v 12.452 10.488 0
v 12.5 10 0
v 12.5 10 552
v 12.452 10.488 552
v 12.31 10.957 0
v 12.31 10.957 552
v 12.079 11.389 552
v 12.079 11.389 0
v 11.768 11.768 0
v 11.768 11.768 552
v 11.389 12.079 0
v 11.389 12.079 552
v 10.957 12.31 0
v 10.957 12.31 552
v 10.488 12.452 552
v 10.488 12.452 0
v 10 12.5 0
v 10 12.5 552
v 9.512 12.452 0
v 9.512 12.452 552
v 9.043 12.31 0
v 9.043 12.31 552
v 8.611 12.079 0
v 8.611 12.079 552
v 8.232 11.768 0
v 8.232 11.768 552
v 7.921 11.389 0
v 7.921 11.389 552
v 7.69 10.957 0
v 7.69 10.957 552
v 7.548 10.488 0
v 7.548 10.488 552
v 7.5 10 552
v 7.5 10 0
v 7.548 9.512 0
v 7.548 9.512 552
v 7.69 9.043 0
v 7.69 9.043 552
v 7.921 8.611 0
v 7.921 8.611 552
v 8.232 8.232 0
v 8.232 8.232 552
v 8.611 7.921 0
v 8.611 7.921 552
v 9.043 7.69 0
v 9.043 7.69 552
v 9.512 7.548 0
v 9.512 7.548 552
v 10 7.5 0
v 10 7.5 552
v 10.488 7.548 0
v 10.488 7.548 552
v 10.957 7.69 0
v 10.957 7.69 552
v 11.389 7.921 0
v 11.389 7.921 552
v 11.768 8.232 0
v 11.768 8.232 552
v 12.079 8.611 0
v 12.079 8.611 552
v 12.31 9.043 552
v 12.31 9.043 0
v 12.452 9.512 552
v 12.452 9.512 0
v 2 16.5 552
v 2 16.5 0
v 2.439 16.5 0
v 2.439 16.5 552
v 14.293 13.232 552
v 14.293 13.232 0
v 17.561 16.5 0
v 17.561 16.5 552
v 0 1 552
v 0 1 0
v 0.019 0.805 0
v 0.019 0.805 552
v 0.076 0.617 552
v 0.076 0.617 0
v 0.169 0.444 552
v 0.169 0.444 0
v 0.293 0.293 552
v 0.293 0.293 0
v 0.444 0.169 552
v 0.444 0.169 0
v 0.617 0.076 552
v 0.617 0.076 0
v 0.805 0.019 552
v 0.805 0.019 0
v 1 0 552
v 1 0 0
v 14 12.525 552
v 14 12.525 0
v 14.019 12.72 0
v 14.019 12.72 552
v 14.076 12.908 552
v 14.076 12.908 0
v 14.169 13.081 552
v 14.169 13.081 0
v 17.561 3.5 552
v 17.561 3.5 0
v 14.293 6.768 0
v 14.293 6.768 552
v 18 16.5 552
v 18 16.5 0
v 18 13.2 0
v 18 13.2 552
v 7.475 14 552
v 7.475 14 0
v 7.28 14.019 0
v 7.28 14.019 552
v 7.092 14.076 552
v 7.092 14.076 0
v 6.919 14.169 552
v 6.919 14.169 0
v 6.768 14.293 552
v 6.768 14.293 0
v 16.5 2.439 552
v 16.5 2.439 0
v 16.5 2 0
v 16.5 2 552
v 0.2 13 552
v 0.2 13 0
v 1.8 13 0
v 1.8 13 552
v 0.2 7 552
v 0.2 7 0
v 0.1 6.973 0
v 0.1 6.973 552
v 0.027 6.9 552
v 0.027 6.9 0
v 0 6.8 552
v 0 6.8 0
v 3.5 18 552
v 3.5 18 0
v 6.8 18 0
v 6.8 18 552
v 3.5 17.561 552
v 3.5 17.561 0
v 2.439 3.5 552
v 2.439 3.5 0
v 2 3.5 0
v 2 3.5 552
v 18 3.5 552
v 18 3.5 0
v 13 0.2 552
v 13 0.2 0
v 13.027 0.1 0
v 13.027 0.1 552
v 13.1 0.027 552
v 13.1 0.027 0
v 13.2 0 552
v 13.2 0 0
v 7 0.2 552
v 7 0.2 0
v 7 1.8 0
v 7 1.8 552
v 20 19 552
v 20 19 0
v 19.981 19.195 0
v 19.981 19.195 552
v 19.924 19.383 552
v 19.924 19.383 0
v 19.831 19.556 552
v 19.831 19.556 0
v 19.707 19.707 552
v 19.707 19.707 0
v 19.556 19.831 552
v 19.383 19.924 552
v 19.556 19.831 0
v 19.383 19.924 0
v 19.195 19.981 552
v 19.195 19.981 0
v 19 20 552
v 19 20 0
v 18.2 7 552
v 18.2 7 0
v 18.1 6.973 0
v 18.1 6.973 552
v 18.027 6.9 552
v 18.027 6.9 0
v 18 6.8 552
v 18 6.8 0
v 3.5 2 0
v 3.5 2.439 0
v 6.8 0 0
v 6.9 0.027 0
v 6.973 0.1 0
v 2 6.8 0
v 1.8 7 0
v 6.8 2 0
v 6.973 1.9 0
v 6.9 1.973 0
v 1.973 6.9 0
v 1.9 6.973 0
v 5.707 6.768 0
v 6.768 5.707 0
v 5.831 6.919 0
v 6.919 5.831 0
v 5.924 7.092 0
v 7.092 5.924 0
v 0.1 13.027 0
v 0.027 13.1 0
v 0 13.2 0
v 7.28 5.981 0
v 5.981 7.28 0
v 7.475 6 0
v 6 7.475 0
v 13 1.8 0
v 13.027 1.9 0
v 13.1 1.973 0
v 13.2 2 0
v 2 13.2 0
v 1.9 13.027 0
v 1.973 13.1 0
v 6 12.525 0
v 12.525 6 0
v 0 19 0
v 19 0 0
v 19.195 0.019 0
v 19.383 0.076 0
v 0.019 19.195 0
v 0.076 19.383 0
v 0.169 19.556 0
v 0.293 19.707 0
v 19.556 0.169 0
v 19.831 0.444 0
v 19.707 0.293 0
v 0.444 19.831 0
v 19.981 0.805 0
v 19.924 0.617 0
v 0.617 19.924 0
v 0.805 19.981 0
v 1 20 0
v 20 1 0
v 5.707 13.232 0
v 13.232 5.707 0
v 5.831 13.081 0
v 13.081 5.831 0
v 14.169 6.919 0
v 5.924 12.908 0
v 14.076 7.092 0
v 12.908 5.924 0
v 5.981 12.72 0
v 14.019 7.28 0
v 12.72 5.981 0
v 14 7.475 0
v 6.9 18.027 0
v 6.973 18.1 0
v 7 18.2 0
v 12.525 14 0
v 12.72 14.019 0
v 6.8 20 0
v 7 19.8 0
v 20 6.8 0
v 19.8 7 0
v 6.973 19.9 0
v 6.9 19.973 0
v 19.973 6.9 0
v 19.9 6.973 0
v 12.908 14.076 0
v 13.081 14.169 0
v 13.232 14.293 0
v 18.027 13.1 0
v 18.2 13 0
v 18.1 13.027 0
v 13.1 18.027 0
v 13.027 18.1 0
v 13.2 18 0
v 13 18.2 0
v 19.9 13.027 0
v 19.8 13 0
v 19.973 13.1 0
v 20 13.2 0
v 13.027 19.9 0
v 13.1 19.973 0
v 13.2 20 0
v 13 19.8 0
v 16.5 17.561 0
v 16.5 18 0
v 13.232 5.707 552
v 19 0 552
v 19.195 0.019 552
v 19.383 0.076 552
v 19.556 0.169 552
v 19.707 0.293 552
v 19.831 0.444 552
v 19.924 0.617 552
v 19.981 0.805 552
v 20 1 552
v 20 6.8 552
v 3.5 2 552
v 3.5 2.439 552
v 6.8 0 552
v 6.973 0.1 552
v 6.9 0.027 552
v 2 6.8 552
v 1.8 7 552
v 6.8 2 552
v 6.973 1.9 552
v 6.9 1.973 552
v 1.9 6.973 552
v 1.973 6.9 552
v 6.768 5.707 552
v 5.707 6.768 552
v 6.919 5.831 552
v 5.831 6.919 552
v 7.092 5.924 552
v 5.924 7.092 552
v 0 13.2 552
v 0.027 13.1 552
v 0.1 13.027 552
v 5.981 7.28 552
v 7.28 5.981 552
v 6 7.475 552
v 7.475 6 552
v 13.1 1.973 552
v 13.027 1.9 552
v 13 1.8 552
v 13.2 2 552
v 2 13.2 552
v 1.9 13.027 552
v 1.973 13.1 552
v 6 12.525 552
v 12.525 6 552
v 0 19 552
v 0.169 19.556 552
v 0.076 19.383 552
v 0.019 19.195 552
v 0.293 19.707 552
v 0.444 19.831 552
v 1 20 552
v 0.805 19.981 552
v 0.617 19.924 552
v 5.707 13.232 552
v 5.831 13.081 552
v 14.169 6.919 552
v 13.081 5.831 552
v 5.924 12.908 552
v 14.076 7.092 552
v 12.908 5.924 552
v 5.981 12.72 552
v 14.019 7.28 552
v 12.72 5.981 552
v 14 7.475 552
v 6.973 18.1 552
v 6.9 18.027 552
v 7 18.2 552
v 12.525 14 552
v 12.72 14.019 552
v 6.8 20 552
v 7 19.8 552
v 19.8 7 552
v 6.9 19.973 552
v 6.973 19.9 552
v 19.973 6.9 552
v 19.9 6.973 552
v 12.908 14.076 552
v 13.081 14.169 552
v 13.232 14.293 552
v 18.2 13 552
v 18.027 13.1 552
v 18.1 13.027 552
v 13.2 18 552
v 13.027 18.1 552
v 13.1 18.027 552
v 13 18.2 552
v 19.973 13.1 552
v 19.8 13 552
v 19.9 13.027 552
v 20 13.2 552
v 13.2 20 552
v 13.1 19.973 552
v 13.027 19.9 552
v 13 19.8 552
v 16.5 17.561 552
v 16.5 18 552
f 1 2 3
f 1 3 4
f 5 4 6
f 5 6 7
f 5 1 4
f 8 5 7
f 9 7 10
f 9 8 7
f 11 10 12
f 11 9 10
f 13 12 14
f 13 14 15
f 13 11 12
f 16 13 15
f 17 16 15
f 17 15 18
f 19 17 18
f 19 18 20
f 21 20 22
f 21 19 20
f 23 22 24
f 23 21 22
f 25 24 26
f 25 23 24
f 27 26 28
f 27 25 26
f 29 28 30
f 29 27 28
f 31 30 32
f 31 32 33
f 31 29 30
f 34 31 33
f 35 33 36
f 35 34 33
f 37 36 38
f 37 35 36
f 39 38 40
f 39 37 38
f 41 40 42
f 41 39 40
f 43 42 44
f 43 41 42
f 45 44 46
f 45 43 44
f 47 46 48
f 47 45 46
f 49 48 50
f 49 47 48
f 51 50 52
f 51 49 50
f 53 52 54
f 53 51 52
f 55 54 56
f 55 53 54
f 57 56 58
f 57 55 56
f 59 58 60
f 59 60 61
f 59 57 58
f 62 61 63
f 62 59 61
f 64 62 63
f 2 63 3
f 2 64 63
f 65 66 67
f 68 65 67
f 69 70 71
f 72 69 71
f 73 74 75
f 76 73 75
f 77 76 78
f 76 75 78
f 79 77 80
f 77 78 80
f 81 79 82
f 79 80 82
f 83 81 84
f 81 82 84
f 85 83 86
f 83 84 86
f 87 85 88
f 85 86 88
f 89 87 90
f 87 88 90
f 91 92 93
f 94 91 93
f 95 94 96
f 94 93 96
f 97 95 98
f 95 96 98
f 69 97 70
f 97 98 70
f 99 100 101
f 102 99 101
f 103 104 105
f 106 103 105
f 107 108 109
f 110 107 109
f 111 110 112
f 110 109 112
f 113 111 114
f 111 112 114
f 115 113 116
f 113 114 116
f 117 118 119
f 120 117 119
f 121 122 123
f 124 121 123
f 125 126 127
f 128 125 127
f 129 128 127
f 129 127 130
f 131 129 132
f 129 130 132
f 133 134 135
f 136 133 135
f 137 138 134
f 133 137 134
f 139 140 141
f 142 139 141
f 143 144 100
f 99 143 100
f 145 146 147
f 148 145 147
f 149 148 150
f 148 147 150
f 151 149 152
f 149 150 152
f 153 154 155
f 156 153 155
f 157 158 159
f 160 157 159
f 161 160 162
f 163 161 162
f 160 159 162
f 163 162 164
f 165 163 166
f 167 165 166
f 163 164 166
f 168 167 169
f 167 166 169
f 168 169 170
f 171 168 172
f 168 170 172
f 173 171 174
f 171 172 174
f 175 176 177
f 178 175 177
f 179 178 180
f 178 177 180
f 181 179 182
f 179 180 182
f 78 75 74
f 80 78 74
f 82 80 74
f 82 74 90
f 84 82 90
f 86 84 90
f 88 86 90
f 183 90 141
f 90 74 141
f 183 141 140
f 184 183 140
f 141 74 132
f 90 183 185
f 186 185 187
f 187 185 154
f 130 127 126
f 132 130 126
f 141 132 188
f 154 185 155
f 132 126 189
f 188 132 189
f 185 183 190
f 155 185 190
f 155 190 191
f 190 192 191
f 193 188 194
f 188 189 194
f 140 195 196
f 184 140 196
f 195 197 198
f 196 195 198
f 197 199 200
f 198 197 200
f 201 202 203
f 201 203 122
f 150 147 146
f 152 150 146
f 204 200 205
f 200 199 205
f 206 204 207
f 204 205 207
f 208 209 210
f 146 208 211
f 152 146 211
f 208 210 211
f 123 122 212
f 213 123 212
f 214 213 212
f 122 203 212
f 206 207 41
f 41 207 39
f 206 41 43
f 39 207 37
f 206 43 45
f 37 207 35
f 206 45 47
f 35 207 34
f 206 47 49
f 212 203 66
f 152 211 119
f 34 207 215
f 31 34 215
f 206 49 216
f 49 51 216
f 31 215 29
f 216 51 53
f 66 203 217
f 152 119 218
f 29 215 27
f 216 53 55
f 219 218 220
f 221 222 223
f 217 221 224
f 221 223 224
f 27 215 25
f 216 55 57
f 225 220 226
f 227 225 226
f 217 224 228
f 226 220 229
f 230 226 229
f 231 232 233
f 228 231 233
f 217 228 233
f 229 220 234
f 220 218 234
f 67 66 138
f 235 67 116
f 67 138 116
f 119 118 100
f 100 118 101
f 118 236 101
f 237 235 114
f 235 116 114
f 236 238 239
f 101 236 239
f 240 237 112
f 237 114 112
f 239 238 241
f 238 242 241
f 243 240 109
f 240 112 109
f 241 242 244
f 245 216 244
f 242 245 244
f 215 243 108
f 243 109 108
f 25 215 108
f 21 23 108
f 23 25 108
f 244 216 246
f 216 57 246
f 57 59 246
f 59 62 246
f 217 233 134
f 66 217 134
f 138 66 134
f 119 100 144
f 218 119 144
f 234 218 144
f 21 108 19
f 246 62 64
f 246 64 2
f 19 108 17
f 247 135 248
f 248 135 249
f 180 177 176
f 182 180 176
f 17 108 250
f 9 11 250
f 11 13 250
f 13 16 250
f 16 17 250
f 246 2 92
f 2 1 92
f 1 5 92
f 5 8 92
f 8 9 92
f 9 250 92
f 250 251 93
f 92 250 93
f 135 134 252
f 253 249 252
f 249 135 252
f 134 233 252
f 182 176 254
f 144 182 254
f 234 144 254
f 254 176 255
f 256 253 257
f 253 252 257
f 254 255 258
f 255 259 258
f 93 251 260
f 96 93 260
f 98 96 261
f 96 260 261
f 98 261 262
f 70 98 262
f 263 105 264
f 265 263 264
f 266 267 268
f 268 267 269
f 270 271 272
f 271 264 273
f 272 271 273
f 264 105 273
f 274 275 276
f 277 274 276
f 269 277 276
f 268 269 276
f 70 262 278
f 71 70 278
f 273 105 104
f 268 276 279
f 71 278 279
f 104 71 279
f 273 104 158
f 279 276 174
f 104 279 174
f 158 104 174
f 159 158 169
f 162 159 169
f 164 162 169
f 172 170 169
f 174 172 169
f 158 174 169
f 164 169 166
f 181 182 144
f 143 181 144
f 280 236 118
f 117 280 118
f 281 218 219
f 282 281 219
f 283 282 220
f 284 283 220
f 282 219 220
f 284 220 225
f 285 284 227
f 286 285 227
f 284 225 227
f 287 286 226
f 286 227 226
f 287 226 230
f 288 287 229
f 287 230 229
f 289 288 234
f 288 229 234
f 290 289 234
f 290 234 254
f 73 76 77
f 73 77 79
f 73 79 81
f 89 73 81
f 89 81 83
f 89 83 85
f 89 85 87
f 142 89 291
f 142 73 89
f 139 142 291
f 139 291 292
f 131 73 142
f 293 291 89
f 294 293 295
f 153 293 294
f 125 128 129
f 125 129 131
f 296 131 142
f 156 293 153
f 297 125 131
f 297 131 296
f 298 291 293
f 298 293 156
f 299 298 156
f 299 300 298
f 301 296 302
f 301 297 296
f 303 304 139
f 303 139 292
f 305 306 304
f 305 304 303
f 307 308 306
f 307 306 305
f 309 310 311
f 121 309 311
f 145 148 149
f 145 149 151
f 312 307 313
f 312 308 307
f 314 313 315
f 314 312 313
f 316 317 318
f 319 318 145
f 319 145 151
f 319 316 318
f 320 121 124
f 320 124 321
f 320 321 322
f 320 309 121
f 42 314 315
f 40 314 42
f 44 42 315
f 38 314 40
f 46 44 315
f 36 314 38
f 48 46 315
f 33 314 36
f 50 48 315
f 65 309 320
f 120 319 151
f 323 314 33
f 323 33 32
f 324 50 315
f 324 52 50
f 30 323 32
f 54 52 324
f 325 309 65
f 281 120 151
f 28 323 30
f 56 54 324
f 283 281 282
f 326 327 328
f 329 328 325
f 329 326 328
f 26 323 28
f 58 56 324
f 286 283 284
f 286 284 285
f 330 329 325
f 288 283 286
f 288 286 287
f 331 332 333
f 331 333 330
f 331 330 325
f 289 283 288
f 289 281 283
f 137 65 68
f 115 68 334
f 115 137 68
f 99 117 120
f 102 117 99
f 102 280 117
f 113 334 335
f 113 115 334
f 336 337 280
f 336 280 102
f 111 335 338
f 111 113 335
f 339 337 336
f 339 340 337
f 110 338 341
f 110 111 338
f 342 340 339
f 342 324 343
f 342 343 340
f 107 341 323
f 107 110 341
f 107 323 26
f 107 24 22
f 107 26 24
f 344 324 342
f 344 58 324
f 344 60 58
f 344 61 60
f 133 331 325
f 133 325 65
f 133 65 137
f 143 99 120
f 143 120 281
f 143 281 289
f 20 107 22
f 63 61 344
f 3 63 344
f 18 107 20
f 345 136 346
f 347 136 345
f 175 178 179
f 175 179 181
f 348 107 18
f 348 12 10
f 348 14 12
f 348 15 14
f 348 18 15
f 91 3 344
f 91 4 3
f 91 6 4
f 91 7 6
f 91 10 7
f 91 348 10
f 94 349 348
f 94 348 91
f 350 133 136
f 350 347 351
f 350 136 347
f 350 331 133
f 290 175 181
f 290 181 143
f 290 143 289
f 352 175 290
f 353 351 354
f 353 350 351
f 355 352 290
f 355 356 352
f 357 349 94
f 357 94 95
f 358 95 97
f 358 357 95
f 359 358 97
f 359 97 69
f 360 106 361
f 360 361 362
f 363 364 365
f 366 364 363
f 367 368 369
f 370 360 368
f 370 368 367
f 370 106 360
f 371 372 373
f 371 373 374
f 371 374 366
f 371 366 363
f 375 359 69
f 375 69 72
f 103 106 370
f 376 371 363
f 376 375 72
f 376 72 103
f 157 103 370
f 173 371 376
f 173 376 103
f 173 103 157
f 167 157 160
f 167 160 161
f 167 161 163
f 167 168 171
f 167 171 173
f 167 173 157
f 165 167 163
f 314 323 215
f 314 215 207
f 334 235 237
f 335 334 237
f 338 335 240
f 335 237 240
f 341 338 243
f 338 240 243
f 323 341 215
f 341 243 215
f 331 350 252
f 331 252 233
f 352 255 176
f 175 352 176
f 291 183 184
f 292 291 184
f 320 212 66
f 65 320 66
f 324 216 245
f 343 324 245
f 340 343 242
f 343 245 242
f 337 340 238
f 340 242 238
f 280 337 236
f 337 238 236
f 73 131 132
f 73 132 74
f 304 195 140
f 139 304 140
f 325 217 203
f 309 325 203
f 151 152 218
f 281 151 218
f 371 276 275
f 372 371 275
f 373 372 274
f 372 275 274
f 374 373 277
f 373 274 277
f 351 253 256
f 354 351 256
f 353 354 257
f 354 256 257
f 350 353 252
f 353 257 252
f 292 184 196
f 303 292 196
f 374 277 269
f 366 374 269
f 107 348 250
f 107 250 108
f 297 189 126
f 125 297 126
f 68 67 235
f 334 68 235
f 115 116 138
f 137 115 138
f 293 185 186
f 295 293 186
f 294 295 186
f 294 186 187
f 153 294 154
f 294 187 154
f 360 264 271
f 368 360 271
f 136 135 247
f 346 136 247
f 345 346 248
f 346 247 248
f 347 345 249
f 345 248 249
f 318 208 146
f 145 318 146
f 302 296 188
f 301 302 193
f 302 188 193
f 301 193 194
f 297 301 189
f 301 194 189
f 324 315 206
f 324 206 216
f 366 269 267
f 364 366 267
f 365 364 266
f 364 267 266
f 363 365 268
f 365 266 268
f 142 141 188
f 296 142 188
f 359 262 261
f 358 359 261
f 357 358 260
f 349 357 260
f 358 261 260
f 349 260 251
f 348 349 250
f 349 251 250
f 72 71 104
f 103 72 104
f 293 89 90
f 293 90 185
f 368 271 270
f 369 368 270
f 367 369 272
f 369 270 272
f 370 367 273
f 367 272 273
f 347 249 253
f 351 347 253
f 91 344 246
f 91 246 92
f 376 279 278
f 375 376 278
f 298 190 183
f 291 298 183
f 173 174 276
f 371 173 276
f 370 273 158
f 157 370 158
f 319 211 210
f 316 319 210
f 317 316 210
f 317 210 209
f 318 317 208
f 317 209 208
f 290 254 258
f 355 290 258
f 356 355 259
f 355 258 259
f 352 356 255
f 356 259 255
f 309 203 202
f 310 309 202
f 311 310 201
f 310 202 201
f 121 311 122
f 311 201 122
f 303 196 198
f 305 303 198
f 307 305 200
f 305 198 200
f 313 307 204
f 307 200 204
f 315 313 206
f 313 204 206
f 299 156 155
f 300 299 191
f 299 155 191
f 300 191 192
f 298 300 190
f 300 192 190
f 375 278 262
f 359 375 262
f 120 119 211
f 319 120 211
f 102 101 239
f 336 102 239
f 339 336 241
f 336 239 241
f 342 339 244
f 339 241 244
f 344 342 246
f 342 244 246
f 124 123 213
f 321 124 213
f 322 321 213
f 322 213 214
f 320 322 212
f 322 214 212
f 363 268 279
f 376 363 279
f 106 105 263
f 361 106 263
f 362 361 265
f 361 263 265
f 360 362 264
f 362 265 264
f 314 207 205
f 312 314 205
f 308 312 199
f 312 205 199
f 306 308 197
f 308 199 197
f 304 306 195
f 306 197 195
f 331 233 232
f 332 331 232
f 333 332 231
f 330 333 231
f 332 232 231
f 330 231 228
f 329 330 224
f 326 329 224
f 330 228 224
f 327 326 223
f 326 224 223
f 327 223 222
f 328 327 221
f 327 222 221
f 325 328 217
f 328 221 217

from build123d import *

# Parameters (mm, degrees)
SKETCH1_R           = 2.5
BOSS_EXTRUDE1_DEPTH = 552


with BuildPart() as part:
    # Sketch1 → Boss-Extrude1 (new body)
    with BuildSketch(Plane.XY):
        with BuildLine():
            Line((0.2, 13), (1.8, 13))
            ThreePointArc((1.8, 13), (1.941421356, 13.058578644), (2, 13.2))
            Line((2, 13.2), (2, 16.5))
            Line((2, 16.5), (2.439339828, 16.5))
            Line((2.439339828, 16.5), (5.707106781, 13.232233047))
            ThreePointArc((5.707106781, 13.232233047), (5.923879533, 12.907809698), (6, 12.525126266))
            Line((6, 12.525126266), (6, 7.474873734))
            ThreePointArc((6, 7.474873734), (5.923879533, 7.092190302), (5.707106781, 6.767766953))
            Line((5.707106781, 6.767766953), (2.439339828, 3.5))
            Line((2.439339828, 3.5), (2, 3.5))
            Line((2, 3.5), (2, 6.8))
            ThreePointArc((2, 6.8), (1.941421356, 6.941421356), (1.8, 7))
            Line((1.8, 7), (0.2, 7))
            ThreePointArc((0.2, 7), (0.058578644, 6.941421356), (0, 6.8))
            Line((0, 6.8), (0, 1))
            ThreePointArc((0, 1), (0.292893219, 0.292893219), (1, 0))
            Line((1, 0), (6.8, 0))
            ThreePointArc((6.8, 0), (6.941421356, 0.058578644), (7, 0.2))
            Line((7, 0.2), (7, 1.8))
            ThreePointArc((7, 1.8), (6.941421356, 1.941421356), (6.8, 2))
            Line((6.8, 2), (3.5, 2))
            Line((3.5, 2), (3.5, 2.439339828))
            Line((3.5, 2.439339828), (6.767766953, 5.707106781))
            ThreePointArc((6.767766953, 5.707106781), (7.092190302, 5.923879533), (7.474873734, 6))
            Line((7.474873734, 6), (10, 6))
            Line((10, 6), (12.525126266, 6))
            ThreePointArc((12.525126266, 6), (12.907809698, 5.923879533), (13.232233047, 5.707106781))
            Line((13.232233047, 5.707106781), (16.5, 2.439339828))
            Line((16.5, 2.439339828), (16.5, 2))
            Line((16.5, 2), (13.2, 2))
            ThreePointArc((13.2, 2), (13.058578644, 1.941421356), (13, 1.8))
            Line((13, 1.8), (13, 0.2))
            ThreePointArc((13, 0.2), (13.058578644, 0.058578644), (13.2, 0))
            Line((13.2, 0), (19, 0))
            ThreePointArc((19, 0), (19.707106781, 0.292893219), (20, 1))
            Line((20, 1), (20, 6.8))
            ThreePointArc((20, 6.8), (19.941421356, 6.941421356), (19.8, 7))
            Line((19.8, 7), (18.2, 7))
            ThreePointArc((18.2, 7), (18.058578644, 6.941421356), (18, 6.8))
            Line((18, 6.8), (18, 3.5))
            Line((18, 3.5), (17.560660172, 3.5))
            Line((17.560660172, 3.5), (14.292893219, 6.767766953))
            ThreePointArc((14.292893219, 6.767766953), (14.076120467, 7.092190302), (14, 7.474873734))
            Line((14, 7.474873734), (14, 12.525126266))
            ThreePointArc((14, 12.525126266), (14.076120467, 12.907809698), (14.292893219, 13.232233047))
            Line((14.292893219, 13.232233047), (17.560660172, 16.5))
            Line((17.560660172, 16.5), (18, 16.5))
            Line((18, 16.5), (18, 13.2))
            ThreePointArc((18, 13.2), (18.058578644, 13.058578644), (18.2, 13))
            Line((18.2, 13), (19.8, 13))
            ThreePointArc((19.8, 13), (19.941421356, 13.058578644), (20, 13.2))
            Line((20, 13.2), (20, 19))
            ThreePointArc((20, 19), (19.707106781, 19.707106781), (19, 20))
            Line((19, 20), (13.2, 20))
            ThreePointArc((13.2, 20), (13.058578644, 19.941421356), (13, 19.8))
            Line((13, 19.8), (13, 18.2))
            ThreePointArc((13, 18.2), (13.058578644, 18.058578644), (13.2, 18))
            Line((13.2, 18), (16.5, 18))
            Line((16.5, 18), (16.5, 17.560660172))
            Line((16.5, 17.560660172), (13.232233047, 14.292893219))
            ThreePointArc((13.232233047, 14.292893219), (12.907809698, 14.076120467), (12.525126266, 14))
            Line((12.525126266, 14), (10, 14))
            Line((10, 14), (7.474873734, 14))
            ThreePointArc((7.474873734, 14), (7.092190302, 14.076120467), (6.767766953, 14.292893219))
            Line((6.767766953, 14.292893219), (3.5, 17.560660172))
            Line((3.5, 17.560660172), (3.5, 18))
            Line((3.5, 18), (6.8, 18))
            ThreePointArc((6.8, 18), (6.941421356, 18.058578644), (7, 18.2))
            Line((7, 18.2), (7, 19.8))
            ThreePointArc((7, 19.8), (6.941421356, 19.941421356), (6.8, 20))
            Line((6.8, 20), (1, 20))
            ThreePointArc((1, 20), (0.292893219, 19.707106781), (0, 19))
            Line((0, 19), (0, 13.2))
            ThreePointArc((0, 13.2), (0.058578644, 13.058578644), (0.2, 13))
        make_face()
        with Locations((10, 10)):
            Circle(SKETCH1_R, mode=Mode.SUBTRACT)
    extrude(amount=BOSS_EXTRUDE1_DEPTH)


solid = part.part
